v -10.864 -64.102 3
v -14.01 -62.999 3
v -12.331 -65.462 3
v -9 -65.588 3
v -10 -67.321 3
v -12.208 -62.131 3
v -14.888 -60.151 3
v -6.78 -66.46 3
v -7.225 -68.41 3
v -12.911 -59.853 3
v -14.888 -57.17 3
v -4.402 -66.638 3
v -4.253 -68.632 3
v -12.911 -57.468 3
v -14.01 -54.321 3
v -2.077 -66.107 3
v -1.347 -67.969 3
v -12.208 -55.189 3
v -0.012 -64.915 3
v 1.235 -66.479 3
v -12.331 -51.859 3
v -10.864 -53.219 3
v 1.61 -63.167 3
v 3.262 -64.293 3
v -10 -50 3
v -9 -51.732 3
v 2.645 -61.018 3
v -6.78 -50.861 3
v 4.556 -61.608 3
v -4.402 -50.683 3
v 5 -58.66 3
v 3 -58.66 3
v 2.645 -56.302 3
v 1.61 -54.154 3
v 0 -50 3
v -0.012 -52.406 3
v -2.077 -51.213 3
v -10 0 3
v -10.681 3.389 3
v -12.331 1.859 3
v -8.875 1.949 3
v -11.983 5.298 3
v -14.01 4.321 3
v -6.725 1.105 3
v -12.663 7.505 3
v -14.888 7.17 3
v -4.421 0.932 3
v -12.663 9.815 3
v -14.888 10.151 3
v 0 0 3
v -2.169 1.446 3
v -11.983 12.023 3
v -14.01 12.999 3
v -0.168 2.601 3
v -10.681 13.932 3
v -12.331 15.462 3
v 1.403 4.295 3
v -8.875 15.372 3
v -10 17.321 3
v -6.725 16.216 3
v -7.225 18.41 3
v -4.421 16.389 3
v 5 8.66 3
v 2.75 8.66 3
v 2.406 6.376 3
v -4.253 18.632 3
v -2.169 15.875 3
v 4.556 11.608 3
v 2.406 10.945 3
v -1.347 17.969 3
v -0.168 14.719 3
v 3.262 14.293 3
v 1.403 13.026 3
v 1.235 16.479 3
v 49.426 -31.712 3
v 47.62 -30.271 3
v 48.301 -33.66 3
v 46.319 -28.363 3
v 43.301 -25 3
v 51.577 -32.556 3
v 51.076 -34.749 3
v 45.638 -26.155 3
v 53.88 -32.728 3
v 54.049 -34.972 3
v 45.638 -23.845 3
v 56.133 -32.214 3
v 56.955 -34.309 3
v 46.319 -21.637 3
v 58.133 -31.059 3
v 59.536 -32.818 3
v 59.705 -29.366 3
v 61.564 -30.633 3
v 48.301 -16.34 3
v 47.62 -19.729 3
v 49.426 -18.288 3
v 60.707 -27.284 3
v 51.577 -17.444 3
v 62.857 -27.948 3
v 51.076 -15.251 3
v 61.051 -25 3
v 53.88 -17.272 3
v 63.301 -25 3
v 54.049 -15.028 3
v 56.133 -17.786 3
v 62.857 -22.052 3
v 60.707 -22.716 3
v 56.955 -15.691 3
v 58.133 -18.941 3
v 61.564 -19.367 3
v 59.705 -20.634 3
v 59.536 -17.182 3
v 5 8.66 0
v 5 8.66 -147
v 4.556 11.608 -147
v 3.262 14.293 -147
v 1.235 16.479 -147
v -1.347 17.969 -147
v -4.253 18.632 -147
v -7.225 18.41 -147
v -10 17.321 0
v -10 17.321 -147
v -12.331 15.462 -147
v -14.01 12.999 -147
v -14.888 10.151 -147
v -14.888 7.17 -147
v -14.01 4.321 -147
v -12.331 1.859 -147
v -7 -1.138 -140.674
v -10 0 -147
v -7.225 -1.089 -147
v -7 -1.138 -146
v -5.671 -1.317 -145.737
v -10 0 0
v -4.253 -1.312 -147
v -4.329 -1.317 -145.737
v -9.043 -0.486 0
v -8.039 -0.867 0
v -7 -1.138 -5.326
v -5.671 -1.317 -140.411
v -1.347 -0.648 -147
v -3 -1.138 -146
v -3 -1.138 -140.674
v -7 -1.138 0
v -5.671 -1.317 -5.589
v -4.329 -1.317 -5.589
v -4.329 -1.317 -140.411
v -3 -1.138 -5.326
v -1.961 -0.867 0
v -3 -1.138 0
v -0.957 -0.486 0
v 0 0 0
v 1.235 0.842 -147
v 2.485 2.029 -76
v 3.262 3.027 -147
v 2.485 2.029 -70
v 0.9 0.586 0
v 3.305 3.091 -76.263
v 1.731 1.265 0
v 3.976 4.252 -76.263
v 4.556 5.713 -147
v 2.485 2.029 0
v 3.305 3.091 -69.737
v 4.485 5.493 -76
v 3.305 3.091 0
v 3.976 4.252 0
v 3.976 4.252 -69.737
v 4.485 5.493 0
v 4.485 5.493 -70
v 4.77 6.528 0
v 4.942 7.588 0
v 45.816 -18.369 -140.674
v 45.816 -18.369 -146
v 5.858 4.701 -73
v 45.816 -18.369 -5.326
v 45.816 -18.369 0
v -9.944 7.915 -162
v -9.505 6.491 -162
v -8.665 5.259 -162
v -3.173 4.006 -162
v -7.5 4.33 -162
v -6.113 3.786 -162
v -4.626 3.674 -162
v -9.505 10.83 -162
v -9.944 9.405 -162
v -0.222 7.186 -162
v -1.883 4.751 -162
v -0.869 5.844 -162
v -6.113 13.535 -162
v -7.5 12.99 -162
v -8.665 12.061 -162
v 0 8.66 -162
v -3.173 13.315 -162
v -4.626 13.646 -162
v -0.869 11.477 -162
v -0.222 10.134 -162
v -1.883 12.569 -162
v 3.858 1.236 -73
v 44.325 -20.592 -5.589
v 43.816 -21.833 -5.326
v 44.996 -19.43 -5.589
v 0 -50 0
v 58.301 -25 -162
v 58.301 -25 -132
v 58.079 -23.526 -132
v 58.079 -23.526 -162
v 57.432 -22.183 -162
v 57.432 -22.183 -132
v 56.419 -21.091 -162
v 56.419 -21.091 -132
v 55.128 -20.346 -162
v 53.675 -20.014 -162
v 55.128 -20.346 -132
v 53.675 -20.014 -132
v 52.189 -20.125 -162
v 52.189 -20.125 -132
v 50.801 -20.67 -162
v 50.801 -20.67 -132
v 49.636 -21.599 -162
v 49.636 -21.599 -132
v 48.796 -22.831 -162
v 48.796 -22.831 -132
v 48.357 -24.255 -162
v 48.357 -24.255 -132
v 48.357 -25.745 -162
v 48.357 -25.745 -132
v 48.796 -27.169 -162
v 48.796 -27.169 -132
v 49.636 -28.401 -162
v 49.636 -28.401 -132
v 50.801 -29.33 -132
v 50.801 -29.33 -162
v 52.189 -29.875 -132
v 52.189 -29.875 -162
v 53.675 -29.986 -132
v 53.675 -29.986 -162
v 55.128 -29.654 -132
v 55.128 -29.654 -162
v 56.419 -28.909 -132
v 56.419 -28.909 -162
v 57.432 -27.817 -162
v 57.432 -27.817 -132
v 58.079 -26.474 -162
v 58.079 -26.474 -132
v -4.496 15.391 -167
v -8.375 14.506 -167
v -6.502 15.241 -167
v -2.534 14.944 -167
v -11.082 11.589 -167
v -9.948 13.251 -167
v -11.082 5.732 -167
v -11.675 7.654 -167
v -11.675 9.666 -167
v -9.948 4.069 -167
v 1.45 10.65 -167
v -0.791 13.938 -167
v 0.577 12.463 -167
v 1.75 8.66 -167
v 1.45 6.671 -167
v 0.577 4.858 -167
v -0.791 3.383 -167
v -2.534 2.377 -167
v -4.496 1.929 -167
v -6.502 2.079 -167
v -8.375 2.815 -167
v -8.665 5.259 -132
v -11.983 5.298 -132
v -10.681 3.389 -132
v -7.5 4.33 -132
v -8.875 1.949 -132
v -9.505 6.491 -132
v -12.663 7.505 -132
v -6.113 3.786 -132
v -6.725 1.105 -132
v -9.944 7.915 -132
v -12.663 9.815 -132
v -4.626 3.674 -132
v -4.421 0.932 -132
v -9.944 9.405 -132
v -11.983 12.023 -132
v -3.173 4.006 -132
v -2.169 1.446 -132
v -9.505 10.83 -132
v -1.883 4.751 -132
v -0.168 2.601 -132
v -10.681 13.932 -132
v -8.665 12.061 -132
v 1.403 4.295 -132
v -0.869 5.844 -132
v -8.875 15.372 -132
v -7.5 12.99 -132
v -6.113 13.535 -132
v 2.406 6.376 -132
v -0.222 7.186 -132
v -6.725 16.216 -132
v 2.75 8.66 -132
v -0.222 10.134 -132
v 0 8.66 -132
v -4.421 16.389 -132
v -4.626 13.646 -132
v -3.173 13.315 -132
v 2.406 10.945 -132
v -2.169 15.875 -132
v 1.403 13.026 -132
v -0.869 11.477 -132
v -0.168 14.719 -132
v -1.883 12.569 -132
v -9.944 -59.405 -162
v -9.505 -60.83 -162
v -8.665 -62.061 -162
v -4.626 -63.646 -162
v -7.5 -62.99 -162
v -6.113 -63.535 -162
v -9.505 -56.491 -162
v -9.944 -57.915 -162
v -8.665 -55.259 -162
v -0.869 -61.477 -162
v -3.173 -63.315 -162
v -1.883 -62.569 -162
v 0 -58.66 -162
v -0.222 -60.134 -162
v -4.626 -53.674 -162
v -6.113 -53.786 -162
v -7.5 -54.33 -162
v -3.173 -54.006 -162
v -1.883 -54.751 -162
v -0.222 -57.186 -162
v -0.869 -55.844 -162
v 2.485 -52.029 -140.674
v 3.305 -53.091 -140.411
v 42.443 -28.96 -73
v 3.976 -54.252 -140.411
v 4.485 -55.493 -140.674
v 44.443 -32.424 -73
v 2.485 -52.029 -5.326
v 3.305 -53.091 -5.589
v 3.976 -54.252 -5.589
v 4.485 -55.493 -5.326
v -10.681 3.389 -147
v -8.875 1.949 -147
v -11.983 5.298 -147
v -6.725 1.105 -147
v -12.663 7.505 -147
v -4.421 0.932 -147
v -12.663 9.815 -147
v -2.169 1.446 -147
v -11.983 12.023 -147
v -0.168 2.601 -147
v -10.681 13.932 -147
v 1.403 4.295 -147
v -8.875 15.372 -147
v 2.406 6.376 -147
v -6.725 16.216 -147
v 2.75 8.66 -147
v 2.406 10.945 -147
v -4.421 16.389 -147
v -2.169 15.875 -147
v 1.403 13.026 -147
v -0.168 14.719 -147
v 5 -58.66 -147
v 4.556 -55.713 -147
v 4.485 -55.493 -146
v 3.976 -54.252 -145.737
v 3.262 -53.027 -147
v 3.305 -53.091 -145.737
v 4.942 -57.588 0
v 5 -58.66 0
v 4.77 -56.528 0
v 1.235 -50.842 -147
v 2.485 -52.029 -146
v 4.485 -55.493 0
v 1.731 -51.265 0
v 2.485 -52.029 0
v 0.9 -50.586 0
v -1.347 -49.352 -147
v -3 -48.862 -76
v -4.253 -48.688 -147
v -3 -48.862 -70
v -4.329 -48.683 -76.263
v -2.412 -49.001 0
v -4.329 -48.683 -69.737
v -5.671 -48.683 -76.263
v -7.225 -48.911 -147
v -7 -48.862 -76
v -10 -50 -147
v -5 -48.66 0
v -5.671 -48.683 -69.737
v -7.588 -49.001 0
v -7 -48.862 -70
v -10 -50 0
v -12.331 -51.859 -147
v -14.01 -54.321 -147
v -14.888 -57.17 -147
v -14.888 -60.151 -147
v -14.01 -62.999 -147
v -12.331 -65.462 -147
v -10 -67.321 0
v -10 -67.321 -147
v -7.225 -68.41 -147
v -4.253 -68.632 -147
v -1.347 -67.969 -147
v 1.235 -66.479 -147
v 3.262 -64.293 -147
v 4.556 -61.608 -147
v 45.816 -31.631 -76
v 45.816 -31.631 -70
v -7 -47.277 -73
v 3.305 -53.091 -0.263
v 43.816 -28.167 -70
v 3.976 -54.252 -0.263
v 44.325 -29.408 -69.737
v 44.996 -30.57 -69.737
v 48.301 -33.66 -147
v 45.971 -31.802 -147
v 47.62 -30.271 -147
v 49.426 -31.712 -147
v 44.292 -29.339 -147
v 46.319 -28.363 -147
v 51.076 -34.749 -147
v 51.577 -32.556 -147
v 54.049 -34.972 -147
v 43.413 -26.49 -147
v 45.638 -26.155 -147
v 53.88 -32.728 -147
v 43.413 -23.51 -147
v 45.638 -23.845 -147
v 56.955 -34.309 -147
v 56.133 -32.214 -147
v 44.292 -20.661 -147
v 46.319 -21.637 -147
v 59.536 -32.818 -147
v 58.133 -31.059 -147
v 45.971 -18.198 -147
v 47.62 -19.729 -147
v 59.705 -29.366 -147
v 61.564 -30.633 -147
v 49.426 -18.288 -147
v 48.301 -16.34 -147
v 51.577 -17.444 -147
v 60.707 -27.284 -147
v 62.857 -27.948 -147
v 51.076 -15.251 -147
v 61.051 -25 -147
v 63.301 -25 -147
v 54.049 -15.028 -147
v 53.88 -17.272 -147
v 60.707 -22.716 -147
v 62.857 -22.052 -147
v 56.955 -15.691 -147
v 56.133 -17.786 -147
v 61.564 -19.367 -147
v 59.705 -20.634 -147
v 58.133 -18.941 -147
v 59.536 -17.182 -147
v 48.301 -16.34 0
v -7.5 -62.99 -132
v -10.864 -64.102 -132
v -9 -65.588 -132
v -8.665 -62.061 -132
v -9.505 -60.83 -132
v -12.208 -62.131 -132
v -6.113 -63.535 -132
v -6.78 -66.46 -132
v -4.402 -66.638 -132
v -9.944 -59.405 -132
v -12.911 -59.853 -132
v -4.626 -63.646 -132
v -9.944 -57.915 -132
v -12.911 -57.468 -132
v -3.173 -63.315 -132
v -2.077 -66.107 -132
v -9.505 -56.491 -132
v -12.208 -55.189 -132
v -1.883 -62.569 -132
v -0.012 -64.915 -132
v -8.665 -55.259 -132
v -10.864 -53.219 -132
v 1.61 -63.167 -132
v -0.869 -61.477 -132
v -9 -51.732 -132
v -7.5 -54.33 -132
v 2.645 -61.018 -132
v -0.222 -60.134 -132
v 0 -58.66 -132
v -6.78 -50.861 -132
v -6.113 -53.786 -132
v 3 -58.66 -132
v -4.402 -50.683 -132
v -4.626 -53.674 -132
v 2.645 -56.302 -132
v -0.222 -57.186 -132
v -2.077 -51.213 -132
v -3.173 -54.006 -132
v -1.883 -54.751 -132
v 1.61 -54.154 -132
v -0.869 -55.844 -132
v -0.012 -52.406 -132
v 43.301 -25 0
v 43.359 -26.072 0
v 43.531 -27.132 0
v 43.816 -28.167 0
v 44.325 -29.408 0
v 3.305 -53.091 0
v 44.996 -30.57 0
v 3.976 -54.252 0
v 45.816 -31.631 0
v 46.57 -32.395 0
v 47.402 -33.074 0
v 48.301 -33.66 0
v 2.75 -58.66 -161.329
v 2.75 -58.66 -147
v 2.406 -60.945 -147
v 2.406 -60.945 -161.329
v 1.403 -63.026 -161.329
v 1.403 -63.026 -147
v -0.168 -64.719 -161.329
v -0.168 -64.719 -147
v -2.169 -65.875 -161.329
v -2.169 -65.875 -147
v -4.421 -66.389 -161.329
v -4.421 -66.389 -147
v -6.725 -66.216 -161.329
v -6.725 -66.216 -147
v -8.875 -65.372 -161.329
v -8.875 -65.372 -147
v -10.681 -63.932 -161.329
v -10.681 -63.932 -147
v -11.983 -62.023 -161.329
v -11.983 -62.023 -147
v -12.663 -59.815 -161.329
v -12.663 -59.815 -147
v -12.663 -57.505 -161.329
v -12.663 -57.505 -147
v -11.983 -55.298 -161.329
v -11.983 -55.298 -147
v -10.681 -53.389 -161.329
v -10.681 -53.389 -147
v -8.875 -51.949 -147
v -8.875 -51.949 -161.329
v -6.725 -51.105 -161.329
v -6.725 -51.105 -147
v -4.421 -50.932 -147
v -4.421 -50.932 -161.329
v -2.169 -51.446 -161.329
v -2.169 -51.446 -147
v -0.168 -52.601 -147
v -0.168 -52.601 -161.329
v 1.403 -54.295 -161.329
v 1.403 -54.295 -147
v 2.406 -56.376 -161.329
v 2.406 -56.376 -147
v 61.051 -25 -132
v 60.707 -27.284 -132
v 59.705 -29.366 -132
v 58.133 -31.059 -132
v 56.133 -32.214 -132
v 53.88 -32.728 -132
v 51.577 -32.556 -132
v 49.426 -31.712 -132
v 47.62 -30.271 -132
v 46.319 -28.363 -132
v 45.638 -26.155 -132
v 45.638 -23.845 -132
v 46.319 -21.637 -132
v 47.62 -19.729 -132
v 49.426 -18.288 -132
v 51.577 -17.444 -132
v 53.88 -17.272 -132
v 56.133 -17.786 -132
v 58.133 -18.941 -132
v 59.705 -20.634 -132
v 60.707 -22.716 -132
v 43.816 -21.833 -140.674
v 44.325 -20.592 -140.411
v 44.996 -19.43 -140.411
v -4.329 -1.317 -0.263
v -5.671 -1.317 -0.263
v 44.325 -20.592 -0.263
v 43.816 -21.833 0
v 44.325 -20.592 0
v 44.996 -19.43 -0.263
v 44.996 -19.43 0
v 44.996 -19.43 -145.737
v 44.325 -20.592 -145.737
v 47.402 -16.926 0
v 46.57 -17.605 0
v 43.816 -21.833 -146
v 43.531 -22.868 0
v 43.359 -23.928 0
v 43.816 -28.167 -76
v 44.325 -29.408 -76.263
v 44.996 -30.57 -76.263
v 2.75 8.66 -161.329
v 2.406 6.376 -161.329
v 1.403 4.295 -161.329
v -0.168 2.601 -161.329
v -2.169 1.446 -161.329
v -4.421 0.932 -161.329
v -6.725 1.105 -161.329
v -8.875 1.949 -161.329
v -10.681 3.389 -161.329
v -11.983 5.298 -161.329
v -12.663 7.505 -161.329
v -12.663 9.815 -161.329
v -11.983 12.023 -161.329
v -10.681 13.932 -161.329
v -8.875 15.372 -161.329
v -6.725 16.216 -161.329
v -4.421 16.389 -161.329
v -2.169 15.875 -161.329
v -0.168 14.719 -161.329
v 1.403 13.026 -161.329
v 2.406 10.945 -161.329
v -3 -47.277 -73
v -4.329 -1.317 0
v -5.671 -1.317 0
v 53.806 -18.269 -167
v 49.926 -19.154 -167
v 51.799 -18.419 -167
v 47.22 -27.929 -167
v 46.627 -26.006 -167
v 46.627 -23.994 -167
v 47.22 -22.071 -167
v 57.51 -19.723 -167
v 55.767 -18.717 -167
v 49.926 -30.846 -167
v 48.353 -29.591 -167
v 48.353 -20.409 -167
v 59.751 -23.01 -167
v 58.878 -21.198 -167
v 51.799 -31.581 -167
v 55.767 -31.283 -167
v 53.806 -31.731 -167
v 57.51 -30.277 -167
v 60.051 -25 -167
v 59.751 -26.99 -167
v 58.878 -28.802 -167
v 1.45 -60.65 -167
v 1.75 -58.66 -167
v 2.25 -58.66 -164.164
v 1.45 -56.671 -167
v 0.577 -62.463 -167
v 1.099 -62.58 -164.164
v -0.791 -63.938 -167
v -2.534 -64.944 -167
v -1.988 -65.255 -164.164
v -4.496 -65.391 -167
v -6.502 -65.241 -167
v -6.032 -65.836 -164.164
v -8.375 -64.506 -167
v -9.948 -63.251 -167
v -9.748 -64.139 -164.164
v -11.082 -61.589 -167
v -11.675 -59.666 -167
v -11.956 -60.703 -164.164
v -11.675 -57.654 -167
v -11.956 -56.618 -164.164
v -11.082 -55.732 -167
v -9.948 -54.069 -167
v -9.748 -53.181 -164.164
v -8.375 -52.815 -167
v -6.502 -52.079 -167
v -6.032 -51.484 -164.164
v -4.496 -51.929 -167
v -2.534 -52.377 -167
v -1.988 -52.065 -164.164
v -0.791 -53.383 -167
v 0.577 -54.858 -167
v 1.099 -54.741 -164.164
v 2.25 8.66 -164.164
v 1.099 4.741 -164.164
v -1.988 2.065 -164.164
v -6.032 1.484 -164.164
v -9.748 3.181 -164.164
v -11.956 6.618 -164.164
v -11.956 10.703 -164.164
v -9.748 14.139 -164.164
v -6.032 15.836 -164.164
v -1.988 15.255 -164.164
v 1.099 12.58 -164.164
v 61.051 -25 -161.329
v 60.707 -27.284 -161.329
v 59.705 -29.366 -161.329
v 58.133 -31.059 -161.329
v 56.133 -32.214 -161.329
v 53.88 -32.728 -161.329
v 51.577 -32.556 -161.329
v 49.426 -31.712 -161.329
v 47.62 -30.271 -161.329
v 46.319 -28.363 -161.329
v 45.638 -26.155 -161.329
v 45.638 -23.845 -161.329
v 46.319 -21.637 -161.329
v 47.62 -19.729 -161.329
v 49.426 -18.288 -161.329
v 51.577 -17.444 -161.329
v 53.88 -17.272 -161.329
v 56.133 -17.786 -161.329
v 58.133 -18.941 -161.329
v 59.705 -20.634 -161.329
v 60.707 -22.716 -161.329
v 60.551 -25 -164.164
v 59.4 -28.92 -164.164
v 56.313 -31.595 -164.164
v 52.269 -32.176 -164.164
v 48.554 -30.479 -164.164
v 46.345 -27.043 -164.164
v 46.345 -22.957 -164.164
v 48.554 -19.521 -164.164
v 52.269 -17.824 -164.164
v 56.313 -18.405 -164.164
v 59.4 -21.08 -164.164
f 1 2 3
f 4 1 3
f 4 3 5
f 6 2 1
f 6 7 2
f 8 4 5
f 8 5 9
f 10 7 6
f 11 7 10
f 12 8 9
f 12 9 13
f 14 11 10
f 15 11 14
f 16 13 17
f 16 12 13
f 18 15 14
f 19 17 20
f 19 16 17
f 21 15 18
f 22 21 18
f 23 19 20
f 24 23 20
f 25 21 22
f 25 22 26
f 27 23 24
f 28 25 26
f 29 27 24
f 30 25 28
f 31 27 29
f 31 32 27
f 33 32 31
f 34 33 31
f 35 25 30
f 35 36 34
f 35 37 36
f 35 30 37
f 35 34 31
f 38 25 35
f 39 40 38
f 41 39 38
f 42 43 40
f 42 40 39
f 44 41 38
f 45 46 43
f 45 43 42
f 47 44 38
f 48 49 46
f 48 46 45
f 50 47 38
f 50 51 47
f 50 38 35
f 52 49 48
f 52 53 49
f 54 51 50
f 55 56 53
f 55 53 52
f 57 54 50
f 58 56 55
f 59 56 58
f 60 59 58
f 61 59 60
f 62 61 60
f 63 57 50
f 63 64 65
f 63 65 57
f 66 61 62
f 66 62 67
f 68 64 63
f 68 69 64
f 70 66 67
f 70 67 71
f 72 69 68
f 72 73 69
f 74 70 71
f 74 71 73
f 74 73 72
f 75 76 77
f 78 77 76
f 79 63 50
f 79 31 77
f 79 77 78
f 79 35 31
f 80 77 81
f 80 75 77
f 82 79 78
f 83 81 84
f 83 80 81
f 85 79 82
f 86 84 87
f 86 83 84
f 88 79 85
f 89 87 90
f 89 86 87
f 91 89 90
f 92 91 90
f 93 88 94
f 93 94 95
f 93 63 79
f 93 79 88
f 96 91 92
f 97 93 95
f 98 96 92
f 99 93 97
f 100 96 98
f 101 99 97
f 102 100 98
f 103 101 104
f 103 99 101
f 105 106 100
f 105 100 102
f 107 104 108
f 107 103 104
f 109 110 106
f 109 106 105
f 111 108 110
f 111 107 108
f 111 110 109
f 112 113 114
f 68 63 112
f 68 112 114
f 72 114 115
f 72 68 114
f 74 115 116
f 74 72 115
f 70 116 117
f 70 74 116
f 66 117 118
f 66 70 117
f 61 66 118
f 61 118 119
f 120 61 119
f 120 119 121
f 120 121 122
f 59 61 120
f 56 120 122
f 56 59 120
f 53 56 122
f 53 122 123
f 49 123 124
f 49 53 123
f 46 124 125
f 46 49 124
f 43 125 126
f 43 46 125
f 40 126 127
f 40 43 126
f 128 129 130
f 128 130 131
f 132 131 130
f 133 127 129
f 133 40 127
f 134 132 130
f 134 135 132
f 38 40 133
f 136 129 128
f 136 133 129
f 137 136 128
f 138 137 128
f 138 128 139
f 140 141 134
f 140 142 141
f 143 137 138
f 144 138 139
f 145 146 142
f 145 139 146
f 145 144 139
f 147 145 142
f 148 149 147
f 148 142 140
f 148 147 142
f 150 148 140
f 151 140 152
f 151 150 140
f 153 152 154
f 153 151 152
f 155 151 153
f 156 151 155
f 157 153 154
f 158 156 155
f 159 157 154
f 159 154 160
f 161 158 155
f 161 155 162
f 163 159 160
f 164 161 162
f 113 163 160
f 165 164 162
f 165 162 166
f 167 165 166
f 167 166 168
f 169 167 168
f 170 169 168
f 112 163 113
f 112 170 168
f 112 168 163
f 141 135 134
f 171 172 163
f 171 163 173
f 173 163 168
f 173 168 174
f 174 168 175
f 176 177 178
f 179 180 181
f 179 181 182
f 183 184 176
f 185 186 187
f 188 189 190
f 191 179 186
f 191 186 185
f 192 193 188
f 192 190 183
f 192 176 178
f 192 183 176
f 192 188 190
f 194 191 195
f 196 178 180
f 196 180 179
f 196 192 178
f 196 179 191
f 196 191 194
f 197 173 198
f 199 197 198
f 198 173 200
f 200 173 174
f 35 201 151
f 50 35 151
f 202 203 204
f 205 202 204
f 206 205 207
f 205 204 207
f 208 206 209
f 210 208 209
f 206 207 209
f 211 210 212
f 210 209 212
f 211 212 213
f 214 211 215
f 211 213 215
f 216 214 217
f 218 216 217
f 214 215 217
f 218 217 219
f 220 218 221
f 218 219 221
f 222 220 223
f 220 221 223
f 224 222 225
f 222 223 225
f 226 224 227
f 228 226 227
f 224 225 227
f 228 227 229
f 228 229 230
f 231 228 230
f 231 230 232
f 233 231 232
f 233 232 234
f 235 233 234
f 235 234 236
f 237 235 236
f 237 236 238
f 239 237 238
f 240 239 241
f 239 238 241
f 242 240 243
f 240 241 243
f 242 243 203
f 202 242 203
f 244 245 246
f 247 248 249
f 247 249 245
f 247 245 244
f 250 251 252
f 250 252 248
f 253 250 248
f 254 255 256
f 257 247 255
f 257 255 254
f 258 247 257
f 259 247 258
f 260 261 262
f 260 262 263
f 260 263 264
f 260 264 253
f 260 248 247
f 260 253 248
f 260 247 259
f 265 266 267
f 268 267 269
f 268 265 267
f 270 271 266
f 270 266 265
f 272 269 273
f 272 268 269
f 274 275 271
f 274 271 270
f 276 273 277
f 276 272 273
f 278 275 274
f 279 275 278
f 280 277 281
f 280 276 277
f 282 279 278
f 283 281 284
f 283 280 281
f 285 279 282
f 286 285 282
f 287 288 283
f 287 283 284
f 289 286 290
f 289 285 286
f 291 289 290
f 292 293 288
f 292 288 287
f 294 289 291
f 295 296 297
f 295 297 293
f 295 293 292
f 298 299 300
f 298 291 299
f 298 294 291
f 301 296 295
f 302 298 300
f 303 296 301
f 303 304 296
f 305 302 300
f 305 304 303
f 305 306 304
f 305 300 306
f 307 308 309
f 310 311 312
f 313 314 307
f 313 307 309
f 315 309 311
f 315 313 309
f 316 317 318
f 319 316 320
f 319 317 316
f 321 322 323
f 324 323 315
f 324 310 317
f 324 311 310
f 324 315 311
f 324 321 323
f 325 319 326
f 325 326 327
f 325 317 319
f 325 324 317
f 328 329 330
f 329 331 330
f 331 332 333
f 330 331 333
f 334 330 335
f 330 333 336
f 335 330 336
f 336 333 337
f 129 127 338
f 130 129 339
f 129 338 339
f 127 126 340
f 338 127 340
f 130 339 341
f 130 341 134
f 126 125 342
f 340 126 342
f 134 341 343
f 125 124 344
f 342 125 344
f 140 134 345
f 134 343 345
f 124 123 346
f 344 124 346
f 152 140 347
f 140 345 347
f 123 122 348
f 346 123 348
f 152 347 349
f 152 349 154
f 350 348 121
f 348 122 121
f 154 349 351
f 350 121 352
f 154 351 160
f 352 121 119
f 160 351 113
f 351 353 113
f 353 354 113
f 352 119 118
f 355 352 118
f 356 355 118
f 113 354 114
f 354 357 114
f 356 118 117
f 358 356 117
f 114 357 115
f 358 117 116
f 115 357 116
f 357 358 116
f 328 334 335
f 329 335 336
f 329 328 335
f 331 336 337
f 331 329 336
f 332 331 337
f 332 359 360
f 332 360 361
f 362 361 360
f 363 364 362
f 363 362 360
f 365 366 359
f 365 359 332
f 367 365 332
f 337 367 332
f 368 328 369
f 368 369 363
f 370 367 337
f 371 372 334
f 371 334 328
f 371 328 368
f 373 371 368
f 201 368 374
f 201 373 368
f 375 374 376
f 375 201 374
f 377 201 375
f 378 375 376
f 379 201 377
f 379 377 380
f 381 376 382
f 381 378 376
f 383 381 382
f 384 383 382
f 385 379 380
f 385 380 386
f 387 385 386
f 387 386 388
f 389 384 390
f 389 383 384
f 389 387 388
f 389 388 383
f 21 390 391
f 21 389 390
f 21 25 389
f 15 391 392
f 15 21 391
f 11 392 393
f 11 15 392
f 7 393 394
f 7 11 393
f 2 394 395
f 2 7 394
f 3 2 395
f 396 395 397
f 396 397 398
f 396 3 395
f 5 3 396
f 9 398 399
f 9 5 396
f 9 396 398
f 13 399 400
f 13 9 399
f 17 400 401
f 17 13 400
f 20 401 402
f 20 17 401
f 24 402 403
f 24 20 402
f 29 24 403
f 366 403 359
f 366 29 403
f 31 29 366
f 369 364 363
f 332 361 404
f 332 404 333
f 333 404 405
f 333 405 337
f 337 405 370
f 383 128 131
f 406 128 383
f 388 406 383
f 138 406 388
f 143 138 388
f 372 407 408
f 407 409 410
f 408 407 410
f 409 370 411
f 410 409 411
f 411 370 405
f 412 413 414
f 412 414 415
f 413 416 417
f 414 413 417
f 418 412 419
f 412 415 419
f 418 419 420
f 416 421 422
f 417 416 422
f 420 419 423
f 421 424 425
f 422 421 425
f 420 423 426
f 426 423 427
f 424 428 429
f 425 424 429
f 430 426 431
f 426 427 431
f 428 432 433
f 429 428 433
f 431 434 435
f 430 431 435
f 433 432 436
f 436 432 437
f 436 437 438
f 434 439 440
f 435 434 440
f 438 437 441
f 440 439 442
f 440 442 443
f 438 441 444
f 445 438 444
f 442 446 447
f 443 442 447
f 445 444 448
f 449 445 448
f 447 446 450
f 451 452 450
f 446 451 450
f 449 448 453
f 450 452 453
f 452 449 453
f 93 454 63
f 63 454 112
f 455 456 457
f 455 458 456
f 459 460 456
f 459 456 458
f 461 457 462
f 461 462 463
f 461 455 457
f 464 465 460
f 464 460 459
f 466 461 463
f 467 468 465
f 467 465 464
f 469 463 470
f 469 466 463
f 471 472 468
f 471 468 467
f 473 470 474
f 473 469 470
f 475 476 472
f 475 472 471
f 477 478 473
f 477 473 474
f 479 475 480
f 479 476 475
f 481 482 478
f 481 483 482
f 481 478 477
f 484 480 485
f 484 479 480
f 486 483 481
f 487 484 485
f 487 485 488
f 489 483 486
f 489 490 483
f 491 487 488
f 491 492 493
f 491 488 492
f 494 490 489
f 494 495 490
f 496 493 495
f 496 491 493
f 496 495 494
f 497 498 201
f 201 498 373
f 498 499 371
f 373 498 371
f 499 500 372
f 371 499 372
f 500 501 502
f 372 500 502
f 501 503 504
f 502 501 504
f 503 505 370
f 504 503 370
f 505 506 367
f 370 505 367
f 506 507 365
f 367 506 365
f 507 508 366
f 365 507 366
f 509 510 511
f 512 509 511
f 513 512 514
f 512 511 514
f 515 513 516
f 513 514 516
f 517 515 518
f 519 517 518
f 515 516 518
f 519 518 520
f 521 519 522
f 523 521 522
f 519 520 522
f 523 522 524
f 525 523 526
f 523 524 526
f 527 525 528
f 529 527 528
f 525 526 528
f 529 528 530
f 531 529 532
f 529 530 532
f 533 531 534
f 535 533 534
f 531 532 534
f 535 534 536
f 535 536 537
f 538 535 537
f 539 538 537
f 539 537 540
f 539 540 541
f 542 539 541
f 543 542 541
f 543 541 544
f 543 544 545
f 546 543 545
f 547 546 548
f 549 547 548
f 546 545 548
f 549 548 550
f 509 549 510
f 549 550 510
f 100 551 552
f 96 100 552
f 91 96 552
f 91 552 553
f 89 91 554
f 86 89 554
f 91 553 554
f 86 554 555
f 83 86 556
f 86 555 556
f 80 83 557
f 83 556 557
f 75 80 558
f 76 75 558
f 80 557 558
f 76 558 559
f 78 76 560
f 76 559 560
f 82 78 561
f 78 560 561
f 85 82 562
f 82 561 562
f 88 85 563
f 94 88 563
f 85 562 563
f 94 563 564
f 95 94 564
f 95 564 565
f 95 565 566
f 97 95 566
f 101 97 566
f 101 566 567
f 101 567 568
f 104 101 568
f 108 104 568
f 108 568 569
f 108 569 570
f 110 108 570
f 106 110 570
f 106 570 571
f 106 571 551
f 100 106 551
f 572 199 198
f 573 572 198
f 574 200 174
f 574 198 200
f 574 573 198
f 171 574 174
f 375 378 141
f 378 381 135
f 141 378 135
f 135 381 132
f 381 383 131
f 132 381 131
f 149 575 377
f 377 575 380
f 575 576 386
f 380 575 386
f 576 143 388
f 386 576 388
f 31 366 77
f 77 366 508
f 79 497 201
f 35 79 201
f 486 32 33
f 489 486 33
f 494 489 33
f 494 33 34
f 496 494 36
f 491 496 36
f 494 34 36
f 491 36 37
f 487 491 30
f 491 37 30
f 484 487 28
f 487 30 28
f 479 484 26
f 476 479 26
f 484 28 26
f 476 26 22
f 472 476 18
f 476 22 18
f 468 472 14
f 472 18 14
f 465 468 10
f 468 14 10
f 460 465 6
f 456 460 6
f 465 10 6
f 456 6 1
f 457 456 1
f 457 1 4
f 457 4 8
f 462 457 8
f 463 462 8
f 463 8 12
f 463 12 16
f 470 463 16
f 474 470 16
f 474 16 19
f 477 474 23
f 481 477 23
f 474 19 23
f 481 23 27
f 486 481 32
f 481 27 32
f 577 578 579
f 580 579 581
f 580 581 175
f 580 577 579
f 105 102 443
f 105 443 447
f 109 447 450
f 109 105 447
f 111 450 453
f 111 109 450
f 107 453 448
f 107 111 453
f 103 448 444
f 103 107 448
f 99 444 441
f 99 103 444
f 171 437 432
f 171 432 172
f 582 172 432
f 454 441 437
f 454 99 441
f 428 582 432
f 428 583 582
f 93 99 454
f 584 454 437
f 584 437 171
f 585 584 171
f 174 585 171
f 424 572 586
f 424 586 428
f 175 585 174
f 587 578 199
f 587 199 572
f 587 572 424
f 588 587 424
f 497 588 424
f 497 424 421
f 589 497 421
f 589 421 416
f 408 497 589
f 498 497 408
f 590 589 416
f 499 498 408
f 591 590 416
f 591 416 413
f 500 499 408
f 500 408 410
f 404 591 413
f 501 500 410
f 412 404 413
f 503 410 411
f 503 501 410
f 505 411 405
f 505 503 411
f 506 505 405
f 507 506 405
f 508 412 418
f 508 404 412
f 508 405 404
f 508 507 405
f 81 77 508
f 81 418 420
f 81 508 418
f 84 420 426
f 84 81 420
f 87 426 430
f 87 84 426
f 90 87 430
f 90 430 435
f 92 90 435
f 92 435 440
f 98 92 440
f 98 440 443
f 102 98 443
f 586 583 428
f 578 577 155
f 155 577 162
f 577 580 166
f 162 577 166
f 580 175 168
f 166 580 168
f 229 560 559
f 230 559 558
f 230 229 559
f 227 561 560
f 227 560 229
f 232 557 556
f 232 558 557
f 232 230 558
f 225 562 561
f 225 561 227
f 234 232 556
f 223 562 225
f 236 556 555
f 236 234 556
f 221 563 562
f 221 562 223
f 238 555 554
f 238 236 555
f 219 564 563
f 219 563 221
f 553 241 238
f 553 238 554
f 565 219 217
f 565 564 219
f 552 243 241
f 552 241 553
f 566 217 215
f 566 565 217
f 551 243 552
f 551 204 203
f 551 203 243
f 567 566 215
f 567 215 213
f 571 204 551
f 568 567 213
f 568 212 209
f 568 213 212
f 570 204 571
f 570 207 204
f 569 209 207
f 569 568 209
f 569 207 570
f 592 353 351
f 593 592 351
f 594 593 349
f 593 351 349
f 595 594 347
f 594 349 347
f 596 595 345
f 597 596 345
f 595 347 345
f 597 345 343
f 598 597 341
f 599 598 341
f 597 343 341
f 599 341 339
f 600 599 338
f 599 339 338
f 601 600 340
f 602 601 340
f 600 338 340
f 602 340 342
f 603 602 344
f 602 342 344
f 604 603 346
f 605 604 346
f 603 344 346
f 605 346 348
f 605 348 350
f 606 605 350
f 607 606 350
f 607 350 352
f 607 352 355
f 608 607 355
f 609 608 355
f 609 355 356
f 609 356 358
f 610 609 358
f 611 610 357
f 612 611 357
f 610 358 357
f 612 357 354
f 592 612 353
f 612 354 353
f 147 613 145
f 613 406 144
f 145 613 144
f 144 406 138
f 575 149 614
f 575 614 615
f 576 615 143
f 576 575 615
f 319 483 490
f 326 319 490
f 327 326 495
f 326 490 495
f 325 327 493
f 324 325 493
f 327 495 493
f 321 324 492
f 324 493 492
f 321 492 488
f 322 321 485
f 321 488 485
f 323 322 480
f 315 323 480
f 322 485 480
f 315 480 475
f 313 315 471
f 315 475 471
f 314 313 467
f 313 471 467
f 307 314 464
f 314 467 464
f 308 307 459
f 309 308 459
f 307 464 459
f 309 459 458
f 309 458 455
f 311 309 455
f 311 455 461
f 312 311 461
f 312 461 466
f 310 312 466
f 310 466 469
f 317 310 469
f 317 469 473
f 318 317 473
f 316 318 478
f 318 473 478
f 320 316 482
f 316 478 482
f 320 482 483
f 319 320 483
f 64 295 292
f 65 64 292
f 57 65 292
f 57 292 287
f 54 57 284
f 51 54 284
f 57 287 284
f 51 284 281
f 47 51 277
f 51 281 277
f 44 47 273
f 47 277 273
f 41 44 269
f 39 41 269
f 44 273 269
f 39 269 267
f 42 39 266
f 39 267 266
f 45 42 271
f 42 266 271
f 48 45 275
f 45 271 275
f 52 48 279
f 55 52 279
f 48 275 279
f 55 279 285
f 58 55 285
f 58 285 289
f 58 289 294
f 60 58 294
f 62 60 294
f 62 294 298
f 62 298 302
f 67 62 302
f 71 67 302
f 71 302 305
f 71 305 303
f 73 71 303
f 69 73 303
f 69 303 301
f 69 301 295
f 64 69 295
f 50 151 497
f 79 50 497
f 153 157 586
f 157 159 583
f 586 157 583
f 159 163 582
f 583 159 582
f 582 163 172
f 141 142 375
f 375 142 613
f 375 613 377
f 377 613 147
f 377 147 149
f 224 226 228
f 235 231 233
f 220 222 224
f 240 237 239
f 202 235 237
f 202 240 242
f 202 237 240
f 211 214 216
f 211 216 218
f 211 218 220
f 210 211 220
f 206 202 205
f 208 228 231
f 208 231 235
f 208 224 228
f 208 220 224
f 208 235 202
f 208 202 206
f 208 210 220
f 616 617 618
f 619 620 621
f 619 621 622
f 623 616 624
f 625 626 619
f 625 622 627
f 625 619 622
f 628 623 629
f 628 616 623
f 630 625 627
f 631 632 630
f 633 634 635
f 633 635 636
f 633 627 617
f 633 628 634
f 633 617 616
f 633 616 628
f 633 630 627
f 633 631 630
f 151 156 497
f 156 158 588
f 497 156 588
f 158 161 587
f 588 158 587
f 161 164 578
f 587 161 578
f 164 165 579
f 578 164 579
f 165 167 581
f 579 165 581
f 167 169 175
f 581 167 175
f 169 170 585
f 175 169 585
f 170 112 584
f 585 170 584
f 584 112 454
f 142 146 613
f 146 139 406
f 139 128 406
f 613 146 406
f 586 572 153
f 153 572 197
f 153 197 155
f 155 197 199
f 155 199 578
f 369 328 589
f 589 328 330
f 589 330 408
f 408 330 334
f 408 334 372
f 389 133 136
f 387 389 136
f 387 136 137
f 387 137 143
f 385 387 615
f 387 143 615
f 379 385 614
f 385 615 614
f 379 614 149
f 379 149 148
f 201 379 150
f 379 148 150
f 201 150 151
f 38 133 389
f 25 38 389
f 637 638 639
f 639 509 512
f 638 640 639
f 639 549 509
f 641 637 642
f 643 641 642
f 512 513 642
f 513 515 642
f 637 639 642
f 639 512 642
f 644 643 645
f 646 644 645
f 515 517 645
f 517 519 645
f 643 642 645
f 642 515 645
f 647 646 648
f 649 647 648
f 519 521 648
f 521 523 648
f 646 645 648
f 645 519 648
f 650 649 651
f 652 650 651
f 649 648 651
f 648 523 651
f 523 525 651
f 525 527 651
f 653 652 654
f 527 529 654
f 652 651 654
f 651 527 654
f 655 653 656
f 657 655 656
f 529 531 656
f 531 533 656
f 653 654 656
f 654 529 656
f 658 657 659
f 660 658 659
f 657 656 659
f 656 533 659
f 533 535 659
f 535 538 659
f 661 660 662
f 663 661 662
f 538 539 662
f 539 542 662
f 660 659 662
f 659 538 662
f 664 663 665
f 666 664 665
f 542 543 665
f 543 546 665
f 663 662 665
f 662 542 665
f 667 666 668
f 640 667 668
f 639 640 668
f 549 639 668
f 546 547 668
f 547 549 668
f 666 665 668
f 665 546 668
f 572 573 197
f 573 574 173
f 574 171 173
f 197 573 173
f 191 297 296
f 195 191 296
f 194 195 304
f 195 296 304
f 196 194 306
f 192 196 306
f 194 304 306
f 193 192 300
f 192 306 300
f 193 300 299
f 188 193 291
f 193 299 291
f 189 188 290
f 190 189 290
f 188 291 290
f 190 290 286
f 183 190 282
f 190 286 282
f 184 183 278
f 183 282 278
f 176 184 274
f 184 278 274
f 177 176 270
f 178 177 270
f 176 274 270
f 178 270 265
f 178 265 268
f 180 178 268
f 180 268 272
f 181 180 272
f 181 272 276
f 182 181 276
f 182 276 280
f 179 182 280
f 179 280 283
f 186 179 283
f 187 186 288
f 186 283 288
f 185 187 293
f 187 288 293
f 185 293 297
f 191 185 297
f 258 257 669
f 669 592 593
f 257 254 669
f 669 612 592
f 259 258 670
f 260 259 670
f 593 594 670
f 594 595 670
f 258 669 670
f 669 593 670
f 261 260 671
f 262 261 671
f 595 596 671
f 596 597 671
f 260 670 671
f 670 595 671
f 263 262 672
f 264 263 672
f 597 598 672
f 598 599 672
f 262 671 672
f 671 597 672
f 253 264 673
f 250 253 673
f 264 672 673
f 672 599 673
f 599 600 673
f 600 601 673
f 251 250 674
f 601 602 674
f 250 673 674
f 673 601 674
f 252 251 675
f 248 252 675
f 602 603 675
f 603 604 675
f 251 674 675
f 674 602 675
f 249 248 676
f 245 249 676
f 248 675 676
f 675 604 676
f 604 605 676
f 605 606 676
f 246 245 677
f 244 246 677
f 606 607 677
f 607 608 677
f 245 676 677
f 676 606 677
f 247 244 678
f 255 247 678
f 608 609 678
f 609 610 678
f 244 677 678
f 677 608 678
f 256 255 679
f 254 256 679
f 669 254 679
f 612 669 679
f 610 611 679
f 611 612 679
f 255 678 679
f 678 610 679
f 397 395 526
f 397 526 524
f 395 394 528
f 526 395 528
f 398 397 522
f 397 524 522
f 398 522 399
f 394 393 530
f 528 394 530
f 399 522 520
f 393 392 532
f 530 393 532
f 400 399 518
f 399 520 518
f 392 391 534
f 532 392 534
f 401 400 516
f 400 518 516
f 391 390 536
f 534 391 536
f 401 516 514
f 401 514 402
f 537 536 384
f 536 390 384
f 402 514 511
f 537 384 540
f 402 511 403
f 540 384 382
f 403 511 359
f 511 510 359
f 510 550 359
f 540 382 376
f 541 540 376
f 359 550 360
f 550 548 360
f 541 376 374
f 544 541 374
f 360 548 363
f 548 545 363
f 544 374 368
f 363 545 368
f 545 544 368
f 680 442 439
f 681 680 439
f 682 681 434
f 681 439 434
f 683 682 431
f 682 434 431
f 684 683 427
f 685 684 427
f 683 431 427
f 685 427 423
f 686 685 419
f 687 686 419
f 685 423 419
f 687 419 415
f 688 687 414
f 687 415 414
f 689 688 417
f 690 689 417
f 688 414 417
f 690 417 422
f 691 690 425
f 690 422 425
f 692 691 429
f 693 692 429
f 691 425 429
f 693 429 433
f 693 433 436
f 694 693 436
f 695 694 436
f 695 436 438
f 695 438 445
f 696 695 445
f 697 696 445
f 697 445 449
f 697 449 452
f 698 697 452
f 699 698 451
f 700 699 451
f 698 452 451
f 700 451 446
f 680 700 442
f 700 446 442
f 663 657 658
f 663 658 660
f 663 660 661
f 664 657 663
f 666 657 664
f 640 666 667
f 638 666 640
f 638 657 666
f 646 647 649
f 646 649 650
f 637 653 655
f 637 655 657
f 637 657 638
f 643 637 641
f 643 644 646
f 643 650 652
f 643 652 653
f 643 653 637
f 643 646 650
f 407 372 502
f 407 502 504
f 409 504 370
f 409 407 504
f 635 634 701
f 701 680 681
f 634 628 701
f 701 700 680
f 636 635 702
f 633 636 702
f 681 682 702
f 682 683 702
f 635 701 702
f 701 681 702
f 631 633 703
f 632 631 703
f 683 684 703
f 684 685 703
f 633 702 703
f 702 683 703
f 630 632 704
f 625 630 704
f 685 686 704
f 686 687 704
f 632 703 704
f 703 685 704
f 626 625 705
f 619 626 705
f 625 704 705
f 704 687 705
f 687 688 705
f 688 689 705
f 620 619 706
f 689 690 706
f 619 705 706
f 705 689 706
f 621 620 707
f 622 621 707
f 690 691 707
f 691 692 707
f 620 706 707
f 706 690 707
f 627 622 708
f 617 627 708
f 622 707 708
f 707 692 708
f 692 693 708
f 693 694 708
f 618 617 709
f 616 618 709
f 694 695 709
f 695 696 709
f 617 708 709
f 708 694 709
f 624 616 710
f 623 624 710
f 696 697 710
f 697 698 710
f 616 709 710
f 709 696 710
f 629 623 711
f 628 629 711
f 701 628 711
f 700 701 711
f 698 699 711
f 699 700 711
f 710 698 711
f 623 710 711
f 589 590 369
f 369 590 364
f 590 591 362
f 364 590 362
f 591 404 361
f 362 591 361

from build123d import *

# Parameters (mm, degrees)
F1_DEPTH  = 3
F2_R      = 10
F3_DEPTH  = 150
F4_W      = 4
F4_H      = 47.7245901334
F5_DEPTH  = 146
F7_DEPTH  = 146
F9_DEPTH  = 146
F11_DEPTH = 4
F13_DEPTH = 4
F15_DEPTH = 4
F16_R     = 10
F17_DEPTH = 150
F18_R     = 8
F19_DEPTH = 135
F20_R     = 7.75
F21_DEPTH = 20
F22_SIZE2 = 5.6712818196
F22_SIZE  = 1
F23_R     = 5
F24_DEPTH = 30
F25_R     = 7.75
F26_DEPTH = 20
F27_SIZE2 = 5.6712818196
F27_SIZE  = 1
F28_R     = 5
F29_DEPTH = 30
F30_R     = 7.75
F31_DEPTH = 20
F32_SIZE2 = 5.6712818196
F32_SIZE  = 1
F33_R     = 5
F34_DEPTH = 30
F35_R     = 10
F35_R_2   = 7.75
F36_DEPTH = 150
F37_R     = 10
F37_R_2   = 7.75
F38_DEPTH = 150


# Not quite as in the source:
# - a feature names something its author has since deleted; it is built from what else it names


with BuildPart() as f1:
    # F0 (on Top) → F1 (new body)
    with BuildSketch(Plane.XY):
        Polygon((63.3012701892, -25), (-10, 17.3205080757), (-10, -67.3205080757), align=None)
        Polygon((0, -50), (0, 0), (43.3012701892, -25), align=None, mode=Mode.SUBTRACT)
    extrude(amount=F1_DEPTH)

    # F2 (on face) → F3 (join)
    with BuildSketch(Plane.XY.offset(3)):
        with Locations((-5, 8.6602540378)):
            Circle(F2_R)
        with Locations((53.3012701892, -25)):
            Circle(F2_R)
        with Locations((-5, -58.6602540378)):
            Circle(F2_R)
    extrude(amount=-F3_DEPTH)

    # F4 (on face) → F5 (join)
    with BuildSketch(Plane(origin=(0, 0, 0), x_dir=(1, 0, 0), z_dir=(0, 0, -1))):
        with Locations((-5, 25)):
            Rectangle(F4_W, F4_H)
    extrude(amount=F5_DEPTH)

    # F6 (on face) → F7 (join)
    with BuildSketch(Plane(origin=(0, 0, 0), x_dir=(1, 0, 0), z_dir=(0, 0, -1))):
        Polygon((4.4852813742, -5.4933253598), (45.815988815, 18.3689697069), (43.815988815, 21.833071322), (2.4852813742, -2.0292237447), align=None)
    extrude(amount=F7_DEPTH)

    # F8 (on face) → F9 (join)
    with BuildSketch(Plane(origin=(0, 0, 0), x_dir=(1, 0, 0), z_dir=(0, 0, -1))):
        Polygon((43.815988815, 28.166928678), (45.815988815, 31.6310302931), (4.4852813742, 55.4933253598), (2.4852813742, 52.0292237447), align=None)
    extrude(amount=F9_DEPTH)

    # F10 (on face) → F11 (cut, through all)
    with BuildSketch(Plane(origin=(-7, 0, 0), x_dir=(0, -1, 0), z_dir=(-1, 0, 0))):
        Polygon((48.8622950667, -76), (1.1377049333, -146), (48.8622950667, -146), align=None)
        Polygon((48.8622950667, -70), (48.8622950667, 0), (1.1377049333, 0), align=None)
        Polygon((1.1377049333, -5.3256151295), (1.1377049333, -140.6743848705), (47.2767375115, -73), align=None)
    extrude(amount=-F11_DEPTH, mode=Mode.SUBTRACT)

    # F12 (on face) → F13 (cut, through all)
    with BuildSketch(Plane(origin=(3.5, 6.0621778265, 0), x_dir=(-0.8660254038, 0.5, 0), z_dir=(0.5, 0.8660254038, 0))):
        Polygon((-1.1377049333, -76), (-48.8622950667, -146), (-1.1377049333, -146), align=None)
        Polygon((-1.1377049333, -70), (-1.1377049333, 0), (-48.8622950667, 0), align=None)
        Polygon((-48.8622950667, -5.3256151295), (-48.8622950667, -140.6743848705), (-2.7232624885, -73), align=None)
    extrude(amount=-F13_DEPTH, mode=Mode.SUBTRACT)

    # F14 (on face) → F15 (cut, through all)
    with BuildSketch(Plane(origin=(25.1506350946, -43.5621778265, 0), x_dir=(0.8660254038, 0.5, 0), z_dir=(0.5, -0.8660254038, 0))):
        Polygon((23.8622950667, -76), (-23.8622950667, -146), (23.8622950667, -146), align=None)
        Polygon((23.8622950667, -70), (23.8622950667, 0), (-23.8622950667, 0), align=None)
        Polygon((-23.8622950667, -5.3256151295), (-23.8622950667, -140.6743848705), (22.2767375115, -73), align=None)
    extrude(amount=-F15_DEPTH, mode=Mode.SUBTRACT)

    # F16 (on face) → F17 (join)
    with BuildSketch(Plane(origin=(0, 0, -147), x_dir=(1, 0, 0), z_dir=(0, 0, -1))):
        with Locations((-5, 58.6602540378)):
            Circle(F16_R)
    extrude(amount=-F17_DEPTH)

    # F18 (on face) → F19 (cut)
    with BuildSketch(Plane.XY.offset(3)):
        with Locations((-5, 8.6602540378)):
            Circle(F18_R)
        with Locations((53.3012701892, -25)):
            Circle(F18_R)
        with Locations((-5, -58.6602540378)):
            Circle(F18_R)
    extrude(amount=-F19_DEPTH, mode=Mode.SUBTRACT)

    # F20 (on face) → F21 (join)
    with BuildSketch(Plane(origin=(0, 0, -147), x_dir=(1, 0, 0), z_dir=(0, 0, -1))):
        with Locations((-5, 58.6602540378)):
            Circle(F20_R)
    extrude(amount=F21_DEPTH)

    # F22
    f22_edges = [f1.edges().sort_by_distance(p)[0] for p in [
        (-12.75, -58.660254, -167),
    ]]
    f22_side = f1.faces().sort_by_distance((-5, -58.660254, -167))[0]
    chamfer(f22_edges, length=F22_SIZE, length2=F22_SIZE2, reference=f22_side)

    # F23 (on face) → F24 (cut)
    with BuildSketch(Plane.XY.offset(-132)):
        with Locations((-5, -58.6602540378)):
            Circle(F23_R)
    extrude(amount=-F24_DEPTH, mode=Mode.SUBTRACT)

    # F25 (on face) → F26 (join)
    with BuildSketch(Plane(origin=(0, 0, -147), x_dir=(1, 0, 0), z_dir=(0, 0, -1))):
        with Locations((53.3012701892, 25)):
            Circle(F25_R)
    extrude(amount=F26_DEPTH)

    # F27
    f27_edges = [f1.edges().sort_by_distance(p)[0] for p in [
        (45.55127, -25, -167),
    ]]
    f27_side = f1.faces().sort_by_distance((53.30127, -25, -167))[0]
    chamfer(f27_edges, length=F27_SIZE, length2=F27_SIZE2, reference=f27_side)

    # F28 (on face) → F29 (cut)
    with BuildSketch(Plane.XY.offset(-132)):
        with Locations((53.3012701892, -25)):
            Circle(F28_R)
    extrude(amount=-F29_DEPTH, mode=Mode.SUBTRACT)

    # F30 (on face) → F31 (join)
    with BuildSketch(Plane(origin=(0, 0, -147), x_dir=(1, 0, 0), z_dir=(0, 0, -1))):
        with Locations((-5, -8.6602540378)):
            Circle(F30_R)
    extrude(amount=F31_DEPTH)

    # F32
    f32_edges = [f1.edges().sort_by_distance(p)[0] for p in [
        (-12.75, 8.660254, -167),
    ]]
    f32_side = f1.faces().sort_by_distance((-5, 8.660254, -167))[0]
    chamfer(f32_edges, length=F32_SIZE, length2=F32_SIZE2, reference=f32_side)

    # F33 (on face) → F34 (cut)
    with BuildSketch(Plane.XY.offset(-132)):
        with Locations((-5, 8.6602540378)):
            Circle(F33_R)
    extrude(amount=-F34_DEPTH, mode=Mode.SUBTRACT)

    # F35 (on face) → F36 (join)
    with BuildSketch(Plane(origin=(0, 0, -147), x_dir=(1, 0, 0), z_dir=(0, 0, -1))):
        with Locations((-5, -8.6602540378)):
            Circle(F35_R)
        with Locations((-5, -8.6602540378)):
            Circle(F35_R_2, mode=Mode.SUBTRACT)
    extrude(amount=-F36_DEPTH)

    # F37 (on face) → F38 (join)
    with BuildSketch(Plane(origin=(0, 0, -147), x_dir=(1, 0, 0), z_dir=(0, 0, -1))):
        with Locations((53.3012701892, 25)):
            Circle(F37_R)
        with Locations((53.3012701892, 25)):
            Circle(F37_R_2, mode=Mode.SUBTRACT)
    extrude(amount=-F38_DEPTH)


solid = f1.part
